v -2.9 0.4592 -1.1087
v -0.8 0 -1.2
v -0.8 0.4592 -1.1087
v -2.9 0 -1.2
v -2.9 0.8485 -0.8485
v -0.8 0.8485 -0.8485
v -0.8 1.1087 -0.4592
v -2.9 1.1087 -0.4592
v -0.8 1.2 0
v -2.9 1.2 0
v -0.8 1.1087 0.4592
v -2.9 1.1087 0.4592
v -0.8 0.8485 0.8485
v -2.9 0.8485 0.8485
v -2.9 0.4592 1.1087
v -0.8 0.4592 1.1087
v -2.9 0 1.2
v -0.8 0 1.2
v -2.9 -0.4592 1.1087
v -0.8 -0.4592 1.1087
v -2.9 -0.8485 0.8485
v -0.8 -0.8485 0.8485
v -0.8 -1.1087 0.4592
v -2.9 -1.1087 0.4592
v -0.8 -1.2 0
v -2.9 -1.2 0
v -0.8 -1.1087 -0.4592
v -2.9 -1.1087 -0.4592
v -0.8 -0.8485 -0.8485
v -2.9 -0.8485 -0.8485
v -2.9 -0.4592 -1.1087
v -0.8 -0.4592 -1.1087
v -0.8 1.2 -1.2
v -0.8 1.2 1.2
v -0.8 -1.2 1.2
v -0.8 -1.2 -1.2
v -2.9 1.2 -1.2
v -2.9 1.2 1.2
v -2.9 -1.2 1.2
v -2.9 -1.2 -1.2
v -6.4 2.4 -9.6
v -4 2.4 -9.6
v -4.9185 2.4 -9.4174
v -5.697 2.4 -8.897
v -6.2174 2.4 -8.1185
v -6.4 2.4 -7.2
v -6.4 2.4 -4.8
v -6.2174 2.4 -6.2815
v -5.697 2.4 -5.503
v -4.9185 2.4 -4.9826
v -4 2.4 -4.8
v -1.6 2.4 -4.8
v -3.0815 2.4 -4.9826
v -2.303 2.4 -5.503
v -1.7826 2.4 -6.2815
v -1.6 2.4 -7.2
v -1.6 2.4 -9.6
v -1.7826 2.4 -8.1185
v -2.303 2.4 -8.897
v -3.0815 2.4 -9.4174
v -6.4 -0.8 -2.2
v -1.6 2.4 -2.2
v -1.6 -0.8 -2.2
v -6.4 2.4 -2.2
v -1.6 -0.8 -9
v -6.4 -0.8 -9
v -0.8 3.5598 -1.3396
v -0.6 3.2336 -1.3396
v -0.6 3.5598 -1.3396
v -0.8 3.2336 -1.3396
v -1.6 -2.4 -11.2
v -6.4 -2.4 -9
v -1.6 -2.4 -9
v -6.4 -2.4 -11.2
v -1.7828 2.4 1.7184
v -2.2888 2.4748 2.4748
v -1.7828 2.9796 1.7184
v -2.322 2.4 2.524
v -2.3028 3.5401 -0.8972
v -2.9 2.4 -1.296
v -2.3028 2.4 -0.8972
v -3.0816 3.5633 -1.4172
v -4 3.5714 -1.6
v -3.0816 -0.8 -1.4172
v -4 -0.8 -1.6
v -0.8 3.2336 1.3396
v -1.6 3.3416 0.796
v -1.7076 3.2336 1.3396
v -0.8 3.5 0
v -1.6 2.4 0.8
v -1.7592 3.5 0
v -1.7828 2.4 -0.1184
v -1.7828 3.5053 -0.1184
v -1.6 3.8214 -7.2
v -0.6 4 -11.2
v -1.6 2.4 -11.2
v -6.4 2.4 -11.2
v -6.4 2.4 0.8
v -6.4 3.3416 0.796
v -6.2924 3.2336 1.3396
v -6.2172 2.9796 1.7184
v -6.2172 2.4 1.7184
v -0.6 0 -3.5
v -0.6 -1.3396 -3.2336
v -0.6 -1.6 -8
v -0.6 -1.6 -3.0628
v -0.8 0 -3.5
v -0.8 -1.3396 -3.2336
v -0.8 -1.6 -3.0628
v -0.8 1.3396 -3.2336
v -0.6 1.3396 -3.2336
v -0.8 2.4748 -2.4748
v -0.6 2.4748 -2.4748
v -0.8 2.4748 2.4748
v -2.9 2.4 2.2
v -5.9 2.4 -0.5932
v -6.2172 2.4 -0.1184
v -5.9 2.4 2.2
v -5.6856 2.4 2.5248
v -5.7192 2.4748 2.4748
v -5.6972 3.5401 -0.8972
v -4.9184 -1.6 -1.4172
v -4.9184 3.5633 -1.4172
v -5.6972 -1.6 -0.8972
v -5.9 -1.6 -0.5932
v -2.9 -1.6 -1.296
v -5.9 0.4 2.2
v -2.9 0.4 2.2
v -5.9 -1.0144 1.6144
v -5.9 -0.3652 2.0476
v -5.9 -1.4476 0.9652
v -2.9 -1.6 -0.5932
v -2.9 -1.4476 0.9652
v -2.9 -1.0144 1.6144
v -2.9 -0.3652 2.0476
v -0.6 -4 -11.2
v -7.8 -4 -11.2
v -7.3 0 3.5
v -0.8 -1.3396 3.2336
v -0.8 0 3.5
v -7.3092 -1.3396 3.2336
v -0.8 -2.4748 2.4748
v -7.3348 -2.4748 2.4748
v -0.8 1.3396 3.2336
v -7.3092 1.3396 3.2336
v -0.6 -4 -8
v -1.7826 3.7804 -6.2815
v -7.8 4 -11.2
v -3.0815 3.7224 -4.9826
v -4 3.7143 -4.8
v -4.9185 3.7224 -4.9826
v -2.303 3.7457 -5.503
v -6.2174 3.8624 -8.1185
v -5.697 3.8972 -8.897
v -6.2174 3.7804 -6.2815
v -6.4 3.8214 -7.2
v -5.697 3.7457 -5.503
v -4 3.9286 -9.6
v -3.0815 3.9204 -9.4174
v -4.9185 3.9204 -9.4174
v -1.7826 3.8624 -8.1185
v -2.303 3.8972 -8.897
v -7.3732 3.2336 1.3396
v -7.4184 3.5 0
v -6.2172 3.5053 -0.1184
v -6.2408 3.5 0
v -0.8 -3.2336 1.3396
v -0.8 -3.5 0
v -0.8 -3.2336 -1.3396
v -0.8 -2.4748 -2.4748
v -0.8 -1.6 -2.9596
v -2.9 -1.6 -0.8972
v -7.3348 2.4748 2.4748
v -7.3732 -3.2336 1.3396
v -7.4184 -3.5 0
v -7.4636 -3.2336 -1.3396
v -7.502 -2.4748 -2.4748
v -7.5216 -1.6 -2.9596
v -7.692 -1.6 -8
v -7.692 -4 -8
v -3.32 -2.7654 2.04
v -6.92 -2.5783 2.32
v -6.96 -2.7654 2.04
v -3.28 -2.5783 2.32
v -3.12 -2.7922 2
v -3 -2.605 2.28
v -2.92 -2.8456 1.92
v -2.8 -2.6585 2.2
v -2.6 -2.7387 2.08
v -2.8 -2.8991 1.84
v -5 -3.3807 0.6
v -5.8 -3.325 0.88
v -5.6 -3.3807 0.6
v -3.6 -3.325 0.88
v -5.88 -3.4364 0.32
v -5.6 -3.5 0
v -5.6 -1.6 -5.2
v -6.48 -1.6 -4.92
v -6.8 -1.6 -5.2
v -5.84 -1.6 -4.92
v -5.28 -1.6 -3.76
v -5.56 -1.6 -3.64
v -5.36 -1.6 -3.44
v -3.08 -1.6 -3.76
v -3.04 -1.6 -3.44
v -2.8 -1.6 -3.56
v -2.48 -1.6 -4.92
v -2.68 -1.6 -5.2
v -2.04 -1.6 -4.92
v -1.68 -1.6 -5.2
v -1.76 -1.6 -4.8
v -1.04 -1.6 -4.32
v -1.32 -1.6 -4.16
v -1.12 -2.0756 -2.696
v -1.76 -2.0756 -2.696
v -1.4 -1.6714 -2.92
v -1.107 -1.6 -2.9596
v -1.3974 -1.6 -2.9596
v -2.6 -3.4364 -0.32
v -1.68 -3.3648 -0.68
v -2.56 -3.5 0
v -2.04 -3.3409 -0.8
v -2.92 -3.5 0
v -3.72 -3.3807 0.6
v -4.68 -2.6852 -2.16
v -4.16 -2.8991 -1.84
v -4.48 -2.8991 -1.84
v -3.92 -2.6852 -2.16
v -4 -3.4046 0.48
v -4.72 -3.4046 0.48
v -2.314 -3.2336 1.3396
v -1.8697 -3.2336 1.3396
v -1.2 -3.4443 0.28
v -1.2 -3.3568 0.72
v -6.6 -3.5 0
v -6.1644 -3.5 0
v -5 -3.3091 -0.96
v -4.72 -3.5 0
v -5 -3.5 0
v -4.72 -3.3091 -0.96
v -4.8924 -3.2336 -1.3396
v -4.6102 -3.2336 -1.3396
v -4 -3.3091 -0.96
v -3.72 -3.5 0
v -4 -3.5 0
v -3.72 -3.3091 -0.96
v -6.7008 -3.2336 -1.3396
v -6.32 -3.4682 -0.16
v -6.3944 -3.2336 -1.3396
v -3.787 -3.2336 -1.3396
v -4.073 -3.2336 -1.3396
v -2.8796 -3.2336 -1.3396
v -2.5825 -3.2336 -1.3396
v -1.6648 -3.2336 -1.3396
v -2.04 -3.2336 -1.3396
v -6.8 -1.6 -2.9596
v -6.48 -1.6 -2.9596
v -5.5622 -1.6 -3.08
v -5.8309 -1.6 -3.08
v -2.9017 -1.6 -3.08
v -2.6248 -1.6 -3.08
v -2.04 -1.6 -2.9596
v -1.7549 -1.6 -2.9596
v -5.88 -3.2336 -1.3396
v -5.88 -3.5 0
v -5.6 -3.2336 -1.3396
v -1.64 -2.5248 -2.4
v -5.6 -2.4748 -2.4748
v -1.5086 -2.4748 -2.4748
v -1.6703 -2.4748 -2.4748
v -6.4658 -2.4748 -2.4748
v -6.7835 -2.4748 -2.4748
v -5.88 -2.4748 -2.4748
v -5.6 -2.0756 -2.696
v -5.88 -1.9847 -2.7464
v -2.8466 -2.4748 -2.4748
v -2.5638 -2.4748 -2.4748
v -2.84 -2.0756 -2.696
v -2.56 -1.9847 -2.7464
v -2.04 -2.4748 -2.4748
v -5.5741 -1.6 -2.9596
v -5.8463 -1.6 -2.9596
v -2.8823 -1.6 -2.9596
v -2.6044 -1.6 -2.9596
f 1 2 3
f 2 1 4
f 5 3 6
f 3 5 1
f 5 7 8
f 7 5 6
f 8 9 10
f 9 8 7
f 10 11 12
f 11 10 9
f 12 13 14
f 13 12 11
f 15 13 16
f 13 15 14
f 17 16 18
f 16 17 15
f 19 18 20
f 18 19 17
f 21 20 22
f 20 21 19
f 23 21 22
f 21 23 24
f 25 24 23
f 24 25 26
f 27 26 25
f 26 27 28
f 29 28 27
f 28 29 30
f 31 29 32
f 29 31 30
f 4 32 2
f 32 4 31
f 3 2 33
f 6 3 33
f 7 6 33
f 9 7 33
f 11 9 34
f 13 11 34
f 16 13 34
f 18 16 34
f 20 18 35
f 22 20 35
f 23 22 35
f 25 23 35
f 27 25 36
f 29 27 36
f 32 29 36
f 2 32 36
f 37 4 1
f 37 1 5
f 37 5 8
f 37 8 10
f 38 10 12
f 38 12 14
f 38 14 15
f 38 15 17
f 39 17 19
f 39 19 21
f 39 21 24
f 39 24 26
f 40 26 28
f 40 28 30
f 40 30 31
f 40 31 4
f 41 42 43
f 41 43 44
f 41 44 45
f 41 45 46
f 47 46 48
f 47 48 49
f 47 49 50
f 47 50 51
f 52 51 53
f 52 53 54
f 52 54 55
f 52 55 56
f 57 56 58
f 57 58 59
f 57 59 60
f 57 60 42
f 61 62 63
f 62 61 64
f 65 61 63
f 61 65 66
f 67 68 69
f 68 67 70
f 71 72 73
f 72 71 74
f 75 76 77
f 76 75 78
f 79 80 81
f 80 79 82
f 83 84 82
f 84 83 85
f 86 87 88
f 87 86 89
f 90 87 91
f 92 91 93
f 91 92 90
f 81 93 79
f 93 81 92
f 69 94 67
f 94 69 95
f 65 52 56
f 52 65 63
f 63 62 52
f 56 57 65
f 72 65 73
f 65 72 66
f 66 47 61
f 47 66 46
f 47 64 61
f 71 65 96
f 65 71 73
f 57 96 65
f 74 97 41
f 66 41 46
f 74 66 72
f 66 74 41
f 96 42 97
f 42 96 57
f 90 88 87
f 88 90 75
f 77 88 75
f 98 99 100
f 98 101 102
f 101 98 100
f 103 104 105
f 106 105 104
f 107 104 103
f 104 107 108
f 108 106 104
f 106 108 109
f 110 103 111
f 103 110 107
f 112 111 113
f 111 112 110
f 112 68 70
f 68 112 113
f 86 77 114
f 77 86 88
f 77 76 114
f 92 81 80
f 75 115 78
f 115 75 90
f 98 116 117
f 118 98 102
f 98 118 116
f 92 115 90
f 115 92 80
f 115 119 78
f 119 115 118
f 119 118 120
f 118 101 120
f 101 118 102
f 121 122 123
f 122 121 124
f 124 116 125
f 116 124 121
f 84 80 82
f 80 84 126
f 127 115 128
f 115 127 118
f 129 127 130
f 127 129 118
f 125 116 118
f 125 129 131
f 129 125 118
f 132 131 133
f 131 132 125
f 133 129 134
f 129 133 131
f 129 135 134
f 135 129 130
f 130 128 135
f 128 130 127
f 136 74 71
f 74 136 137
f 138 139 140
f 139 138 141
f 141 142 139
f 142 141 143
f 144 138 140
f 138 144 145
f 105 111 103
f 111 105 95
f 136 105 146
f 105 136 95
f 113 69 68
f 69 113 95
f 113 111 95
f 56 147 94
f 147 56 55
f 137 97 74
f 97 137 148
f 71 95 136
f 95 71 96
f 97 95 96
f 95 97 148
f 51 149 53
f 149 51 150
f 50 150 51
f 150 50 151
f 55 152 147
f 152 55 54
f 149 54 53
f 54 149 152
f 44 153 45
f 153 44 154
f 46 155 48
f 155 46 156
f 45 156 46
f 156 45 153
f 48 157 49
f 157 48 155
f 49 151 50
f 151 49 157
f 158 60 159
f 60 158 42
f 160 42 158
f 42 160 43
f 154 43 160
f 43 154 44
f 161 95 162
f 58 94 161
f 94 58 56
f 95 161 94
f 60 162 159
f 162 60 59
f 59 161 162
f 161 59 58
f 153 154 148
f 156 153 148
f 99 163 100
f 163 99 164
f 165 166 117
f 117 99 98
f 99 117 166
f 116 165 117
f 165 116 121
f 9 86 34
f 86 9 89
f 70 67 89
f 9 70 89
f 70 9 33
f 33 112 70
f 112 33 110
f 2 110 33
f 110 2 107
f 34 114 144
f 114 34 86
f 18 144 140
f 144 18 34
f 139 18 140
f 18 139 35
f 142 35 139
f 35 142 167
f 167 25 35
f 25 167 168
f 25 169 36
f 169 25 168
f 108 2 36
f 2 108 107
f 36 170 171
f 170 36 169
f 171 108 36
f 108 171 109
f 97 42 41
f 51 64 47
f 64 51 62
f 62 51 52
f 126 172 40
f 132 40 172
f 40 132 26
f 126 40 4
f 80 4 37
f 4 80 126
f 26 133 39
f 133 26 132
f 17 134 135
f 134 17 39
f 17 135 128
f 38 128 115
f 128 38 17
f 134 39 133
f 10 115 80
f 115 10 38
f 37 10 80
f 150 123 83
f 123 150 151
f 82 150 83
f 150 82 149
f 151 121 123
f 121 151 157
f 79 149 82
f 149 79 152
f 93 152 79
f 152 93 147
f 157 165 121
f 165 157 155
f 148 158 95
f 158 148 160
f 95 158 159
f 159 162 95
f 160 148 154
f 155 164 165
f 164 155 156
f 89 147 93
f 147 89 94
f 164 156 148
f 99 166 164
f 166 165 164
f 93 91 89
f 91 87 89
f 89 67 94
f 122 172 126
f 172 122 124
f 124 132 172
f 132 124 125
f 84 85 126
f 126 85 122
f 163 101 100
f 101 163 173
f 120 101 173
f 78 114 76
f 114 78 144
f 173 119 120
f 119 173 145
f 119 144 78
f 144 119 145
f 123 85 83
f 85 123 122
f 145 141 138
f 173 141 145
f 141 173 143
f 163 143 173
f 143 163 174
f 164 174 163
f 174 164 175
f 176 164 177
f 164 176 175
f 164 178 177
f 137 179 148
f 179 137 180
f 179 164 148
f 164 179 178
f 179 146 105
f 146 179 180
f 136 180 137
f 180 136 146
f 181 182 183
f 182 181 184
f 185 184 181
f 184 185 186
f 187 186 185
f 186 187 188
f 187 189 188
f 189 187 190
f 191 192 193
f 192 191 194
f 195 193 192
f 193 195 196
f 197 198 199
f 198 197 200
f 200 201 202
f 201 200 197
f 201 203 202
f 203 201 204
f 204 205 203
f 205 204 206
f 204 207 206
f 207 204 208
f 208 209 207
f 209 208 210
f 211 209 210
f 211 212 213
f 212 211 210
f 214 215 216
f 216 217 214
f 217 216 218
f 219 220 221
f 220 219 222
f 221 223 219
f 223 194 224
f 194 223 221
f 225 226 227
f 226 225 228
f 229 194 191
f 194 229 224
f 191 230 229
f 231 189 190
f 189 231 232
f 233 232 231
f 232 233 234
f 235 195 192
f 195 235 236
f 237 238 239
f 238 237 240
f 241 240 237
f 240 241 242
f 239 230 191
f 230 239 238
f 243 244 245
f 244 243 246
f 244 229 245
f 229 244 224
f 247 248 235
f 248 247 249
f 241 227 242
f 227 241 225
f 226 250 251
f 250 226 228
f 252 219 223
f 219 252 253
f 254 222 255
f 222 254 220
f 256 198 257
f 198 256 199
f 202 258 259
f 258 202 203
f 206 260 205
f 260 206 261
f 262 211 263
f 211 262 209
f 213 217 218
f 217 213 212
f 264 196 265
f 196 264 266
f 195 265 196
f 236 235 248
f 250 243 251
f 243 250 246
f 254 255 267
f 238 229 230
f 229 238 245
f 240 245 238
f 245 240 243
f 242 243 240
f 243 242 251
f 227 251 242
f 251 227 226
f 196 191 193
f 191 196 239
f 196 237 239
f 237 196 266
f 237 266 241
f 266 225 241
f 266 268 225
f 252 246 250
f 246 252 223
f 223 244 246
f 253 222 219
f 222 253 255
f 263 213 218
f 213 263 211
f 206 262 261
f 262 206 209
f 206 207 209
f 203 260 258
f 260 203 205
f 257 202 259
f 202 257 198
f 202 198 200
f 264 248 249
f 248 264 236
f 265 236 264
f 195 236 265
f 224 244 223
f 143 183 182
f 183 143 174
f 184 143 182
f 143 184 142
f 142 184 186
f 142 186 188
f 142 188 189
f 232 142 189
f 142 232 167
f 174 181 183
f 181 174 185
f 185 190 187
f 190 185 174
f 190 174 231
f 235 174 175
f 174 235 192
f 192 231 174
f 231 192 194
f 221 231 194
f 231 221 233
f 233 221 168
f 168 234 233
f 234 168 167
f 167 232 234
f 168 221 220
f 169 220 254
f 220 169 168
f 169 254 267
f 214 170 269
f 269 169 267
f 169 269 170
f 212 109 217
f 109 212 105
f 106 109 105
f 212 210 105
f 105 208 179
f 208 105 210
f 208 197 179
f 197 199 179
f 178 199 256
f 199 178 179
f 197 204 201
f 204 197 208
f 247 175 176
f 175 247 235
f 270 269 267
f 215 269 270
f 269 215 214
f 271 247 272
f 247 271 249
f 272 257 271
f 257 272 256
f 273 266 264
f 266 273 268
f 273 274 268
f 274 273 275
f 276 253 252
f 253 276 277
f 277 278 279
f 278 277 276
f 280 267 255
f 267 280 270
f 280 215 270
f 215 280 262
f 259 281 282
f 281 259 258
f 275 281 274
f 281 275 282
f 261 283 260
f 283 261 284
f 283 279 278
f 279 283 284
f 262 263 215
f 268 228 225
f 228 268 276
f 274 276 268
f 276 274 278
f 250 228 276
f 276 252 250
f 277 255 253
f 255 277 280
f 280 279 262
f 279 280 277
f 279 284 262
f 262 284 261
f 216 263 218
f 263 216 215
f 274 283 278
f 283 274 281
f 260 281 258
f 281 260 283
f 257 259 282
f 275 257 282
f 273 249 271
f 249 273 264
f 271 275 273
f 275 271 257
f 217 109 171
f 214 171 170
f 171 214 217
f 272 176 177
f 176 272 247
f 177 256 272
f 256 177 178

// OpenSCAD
use <../lib.scad>
use <s/3817bs01.scad>
function ldraw_lib__3816bpbc() = [
// 0 ~Minifig Leg Right with Iron Man Armoured Suit Mark VII Pattern (Obsolete)
// 0 Name: 3816bpbc.dat
// 0 Author: Magnus Forsberg [MagFors]
// 0 !LDRAW_ORG Part UPDATE 2023-03
// 0 !LICENSE Licensed under CC BY 4.0 : see CAreadme.txt
// 
// 0 BFC CERTIFY CCW
  [0,"BFC","CERTIFY"],
  [0,"BFC","CCW"],
// 
// 0 !KEYWORDS Bricklink 970c00pb0155, set 10721, set 6869
// 
// 0 !HISTORY 2013-12-23 [MagFors] Original design as 3815c89
// 0 !HISTORY 2020-06-18 [MagFors] Adapted to corrected geometry
// 0 !HISTORY 2020-12-29 [PTadmin] Official Update 2020-03
// 0 !HISTORY 2023-06-01 [Holly-Wood] Obsoleted due to bad geometry
// 0 !HISTORY 2023-06-24 [OrionP] Official Update 2023-03
// 
// 
// 1 16 0 0 0 -1 0 0 0 1 0 0 0 1 s\3817bs01.dat
  [1,16,0,0,0,-1,0,0,0,1,0,0,0,1, ldraw_lib__s__3817bs01()],
// 4 16 -19.23 20 -4 -19.23 20 -10 -1.5 20 -10 -1.5 20 -4
  [4,16,-19.23,20,-4,-19.23,20,-10,-1.5,20,-10,-1.5,20,-4],
// 4 16 -19.23 20 -10 -19.5 28 -10 -1.5 28 -10 -1.5 20 -10
  [4,16,-19.23,20,-10,-19.5,28,-10,-1.5,28,-10,-1.5,20,-10],
// 5 24 -2 3.349 -8.084 -18.659 3.349 -8.084 -2 0 -8.75 -2 6.187 -6.187
  [5,24,-2,3.349,-8.084,-18.659,3.349,-8.084,-2,0,-8.75,-2,6.187,-6.187],
// 5 24 -2 6.187 -6.187 -18.755 6.187 -6.187 -2 7.399 -4 -2 3.349 -8.084
  [5,24,-2,6.187,-6.187,-18.755,6.187,-6.187,-2,7.399,-4,-2,3.349,-8.084],
// 5 24 -2 0 -8.75 -18.546 0 -8.75 -2 3.349 -8.084 -2 -3.349 -8.084
  [5,24,-2,0,-8.75,-18.546,0,-8.75,-2,3.349,-8.084,-2,-3.349,-8.084],
// 5 24 -2 -3.349 -8.084 -18.433 -3.349 -8.084 -2 0 -8.75 -2 -6.187 -6.187
  [5,24,-2,-3.349,-8.084,-18.433,-3.349,-8.084,-2,0,-8.75,-2,-6.187,-6.187],
// 
// 0 // knee pad
// 4 0 -17.3 -5.8 -6.4457 -17.4 -5.1 -6.9136 -8.3 -5.1 -6.9136 -8.2 -5.8 -6.4457
  [4,0,-17.3,-5.8,-6.4457,-17.4,-5.1,-6.9136,-8.3,-5.1,-6.9136,-8.2,-5.8,-6.4457],
// 4 0 -8.2 -5.8 -6.4457 -8.3 -5.1 -6.9136 -7.8 -5 -6.9804 -7.5 -5.7 -6.5125
  [4,0,-8.2,-5.8,-6.4457,-8.3,-5.1,-6.9136,-7.8,-5,-6.9804,-7.5,-5.7,-6.5125],
// 4 0 -7.5 -5.7 -6.5125 -7.8 -5 -6.9804 -7.3 -4.8 -7.1141 -7 -5.5 -6.6462
  [4,0,-7.5,-5.7,-6.5125,-7.8,-5,-6.9804,-7.3,-4.8,-7.1141,-7,-5.5,-6.6462],
// 4 0 -6.5 -5.2 -6.8467 -7 -5.5 -6.6462 -7.3 -4.8 -7.1141 -7 -4.6 -7.2478
  [4,0,-6.5,-5.2,-6.8467,-7,-5.5,-6.6462,-7.3,-4.8,-7.1141,-7,-4.6,-7.2478],
// 4 0 -12.5 -1.5 -8.4517 -9 -2.2 -8.3125 -14.5 -2.2 -8.3125 -14 -1.5 -8.4517
  [4,0,-12.5,-1.5,-8.4517,-9,-2.2,-8.3125,-14.5,-2.2,-8.3125,-14,-1.5,-8.4517],
// 4 0 -14 -1.5 -8.4517 -14.5 -2.2 -8.3125 -14.7 -.8 -8.5909 -14 0 -8.75
  [4,0,-14,-1.5,-8.4517,-14.5,-2.2,-8.3125,-14.7,-.8,-8.5909,-14,0,-8.75],
// 4 0 -16.2 12.3 -4 -17 13 -4 -14 13 -4 -14.6 12.3 -4
  [4,0,-16.2,12.3,-4,-17,13,-4,-14,13,-4,-14.6,12.3,-4],
// 4 0 -13.9 9.1 -4 -14.6 12.3 -4 -14 13 -4 -13.2 9.4 -4
  [4,0,-13.9,9.1,-4,-14.6,12.3,-4,-14,13,-4,-13.2,9.4,-4],
// 4 0 -13.4 8.6 -4 -13.9 9.1 -4 -13.2 9.4 -4 -7.7 9.4 -4
  [4,0,-13.4,8.6,-4,-13.9,9.1,-4,-13.2,9.4,-4,-7.7,9.4,-4],
// 4 0 -7.6 8.6 -4 -13.4 8.6 -4 -7.7 9.4 -4 -7 8.9 -4
  [4,0,-7.6,8.6,-4,-13.4,8.6,-4,-7.7,9.4,-4,-7,8.9,-4],
// 4 0 -7.7 9.4 -4 -6.7 13 -4 -6.2 12.3 -4 -7 8.9 -4
  [4,0,-7.7,9.4,-4,-6.7,13,-4,-6.2,12.3,-4,-7,8.9,-4],
// 4 0 -4.2 13 -4 -5.1 12.3 -4 -6.2 12.3 -4 -6.7 13 -4
  [4,0,-4.2,13,-4,-5.1,12.3,-4,-6.2,12.3,-4,-6.7,13,-4],
// 3 0 -4.4 12 -4 -5.1 12.3 -4 -4.2 13 -4
  [3,0,-4.4,12,-4,-5.1,12.3,-4,-4.2,13,-4],
// 4 0 -3.3 10.4 -4 -4.4 12 -4 -4.2 13 -4 -2.6 10.8 -4
  [4,0,-3.3,10.4,-4,-4.4,12,-4,-4.2,13,-4,-2.6,10.8,-4],
// 3 0 -2.8 6.74 -5.1891 -4.4 6.74 -5.1891 -3.5 7.3 -4.1786
  [3,0,-2.8,6.74,-5.1891,-4.4,6.74,-5.1891,-3.5,7.3,-4.1786],
// 4 0 -3.5 7.3 -4.1786 -3.4936 7.399 -4 -2.7675 7.399 -4 -2.8 6.74 -5.1891
  [4,0,-3.5,7.3,-4.1786,-3.4936,7.399,-4,-2.7675,7.399,-4,-2.8,6.74,-5.1891],
// 4 0 -6.5 .8 -8.5909 -5.1 2 -8.3523 -4.2 1.7 -8.4119 -6.4 0 -8.75
  [4,0,-6.5,.8,-8.5909,-5.1,2,-8.3523,-4.2,1.7,-8.4119,-6.4,0,-8.75],
// 3 0 -6.4 0 -8.75 -7.3 0 -8.75 -6.5 .8 -8.5909
  [3,0,-6.4,0,-8.75,-7.3,0,-8.75,-6.5,.8,-8.5909],
// 4 0 -9.3 -1.5 -8.4517 -7.3 0 -8.75 -6.4 0 -8.75 -9 -2.2 -8.3125
  [4,0,-9.3,-1.5,-8.4517,-7.3,0,-8.75,-6.4,0,-8.75,-9,-2.2,-8.3125],
// 4 0 -11.2 4.6 -7.2478 -11.7 5.4 -6.7131 -9.8 5.4 -6.7131 -10.4 4.6 -7.2478
  [4,0,-11.2,4.6,-7.2478,-11.7,5.4,-6.7131,-9.8,5.4,-6.7131,-10.4,4.6,-7.2478],
// 4 0 -10 -1.2 -8.5114 -9.3 -1.5 -8.4517 -9 -2.2 -8.3125 -12.5 -1.5 -8.4517
  [4,0,-10,-1.2,-8.5114,-9.3,-1.5,-8.4517,-9,-2.2,-8.3125,-12.5,-1.5,-8.4517],
// 3 0 -12.5 -1.5 -8.4517 -11.8 -1.2 -8.5114 -10 -1.2 -8.5114
  [3,0,-12.5,-1.5,-8.4517,-11.8,-1.2,-8.5114,-10,-1.2,-8.5114],
// 4 0 -6.5 -5.2 -6.8467 -7 -4.6 -7.2478 -5.785 -3.349 -8.084 -4.6743 -3.349 -8.084
  [4,0,-6.5,-5.2,-6.8467,-7,-4.6,-7.2478,-5.785,-3.349,-8.084,-4.6743,-3.349,-8.084],
// 4 0 -3 -.7 -8.6108 -3 -1.8 -8.392 -4.6743 -3.349 -8.084 -5.785 -3.349 -8.084
  [4,0,-3,-.7,-8.6108,-3,-1.8,-8.392,-4.6743,-3.349,-8.084,-5.785,-3.349,-8.084],
// 4 0 -15.411 0 -8.75 -14.7 -.8 -8.5909 -14.5 -2.2 -8.3125 -16.5 0 -8.75
  [4,0,-15.411,0,-8.75,-14.7,-.8,-8.5909,-14.5,-2.2,-8.3125,-16.5,0,-8.75],
// 4 0 -11.8 0 -8.75 -12.5 0 -8.75 -12.5 2.4 -8.2727 -11.8 2.4 -8.2727
  [4,0,-11.8,0,-8.75,-12.5,0,-8.75,-12.5,2.4,-8.2727,-11.8,2.4,-8.2727],
// 4 0 -12.2311 3.349 -8.084 -11.5254 3.349 -8.084 -11.8 2.4 -8.2727 -12.5 2.4 -8.2727
  [4,0,-12.2311,3.349,-8.084,-11.5254,3.349,-8.084,-11.8,2.4,-8.2727,-12.5,2.4,-8.2727],
// 4 0 -11.8 0 -8.75 -11.8 -1.2 -8.5114 -12.5 -1.5 -8.4517 -12.5 0 -8.75
  [4,0,-11.8,0,-8.75,-11.8,-1.2,-8.5114,-12.5,-1.5,-8.4517,-12.5,0,-8.75],
// 4 0 -9.3 0 -8.75 -10 0 -8.75 -10 2.4 -8.2727 -9.3 2.4 -8.2727
  [4,0,-9.3,0,-8.75,-10,0,-8.75,-10,2.4,-8.2727,-9.3,2.4,-8.2727],
// 4 0 -9.3 0 -8.75 -9.3 -1.5 -8.4517 -10 -1.2 -8.5114 -10 0 -8.75
  [4,0,-9.3,0,-8.75,-9.3,-1.5,-8.4517,-10,-1.2,-8.5114,-10,0,-8.75],
// 4 0 -15.986 3.349 -8.084 -15.8 .4 -8.6705 -16.5 0 -8.75 -16.7519 3.349 -8.084
  [4,0,-15.986,3.349,-8.084,-15.8,.4,-8.6705,-16.5,0,-8.75,-16.7519,3.349,-8.084],
// 4 0 -12.2311 3.349 -8.084 -11.7 5.4 -6.7131 -11.2 4.6 -7.2478 -11.5254 3.349 -8.084
  [4,0,-12.2311,3.349,-8.084,-11.7,5.4,-6.7131,-11.2,4.6,-7.2478,-11.5254,3.349,-8.084],
// 4 0 -10.1824 3.349 -8.084 -10.4 4.6 -7.2478 -9.8 5.4 -6.7131 -9.4676 3.349 -8.084
  [4,0,-10.1824,3.349,-8.084,-10.4,4.6,-7.2478,-9.8,5.4,-6.7131,-9.4676,3.349,-8.084],
// 4 0 -6.4562 3.349 -8.084 -6.5 .8 -8.5909 -7.3 0 -8.75 -7.1991 3.349 -8.084
  [4,0,-6.4562,3.349,-8.084,-6.5,.8,-8.5909,-7.3,0,-8.75,-7.1991,3.349,-8.084],
// 4 0 -4.1619 3.349 -8.084 -4.2 1.7 -8.4119 -5.1 2 -8.3523 -5.1 3.349 -8.084
  [4,0,-4.1619,3.349,-8.084,-4.2,1.7,-8.4119,-5.1,2,-8.3523,-5.1,3.349,-8.084],
// 4 0 -17 7.399 -4 -17 13 -4 -16.2 12.3 -4 -16.2 7.399 -4
  [4,0,-17,7.399,-4,-17,13,-4,-16.2,12.3,-4,-16.2,7.399,-4],
// 4 0 -14.5772 7.7 -4 -13.9 9.1 -4 -13.4 8.6 -4 -13.9056 7.7 -4
  [4,0,-14.5772,7.7,-4,-13.9,9.1,-4,-13.4,8.6,-4,-13.9056,7.7,-4],
// 4 0 -7.2542 7.7 -4 -7.6 8.6 -4 -7 8.9 -4 -6.5619 7.7 -4
  [4,0,-7.2542,7.7,-4,-7.6,8.6,-4,-7,8.9,-4,-6.5619,7.7,-4],
// 4 0 -5.1 12.3 -4 -4.4 12 -4 -4.3872 7.399 -4 -5.1 7.399 -4
  [4,0,-5.1,12.3,-4,-4.4,12,-4,-4.3872,7.399,-4,-5.1,7.399,-4],
// 4 0 -3.4936 7.399 -4 -3.3 10.4 -4 -2.6 10.8 -4 -2.7675 7.399 -4
  [4,0,-3.4936,7.399,-4,-3.3,10.4,-4,-2.6,10.8,-4,-2.7675,7.399,-4],
// 4 0 -14 3.349 -8.084 -14 0 -8.75 -14.7 0 -8.75 -14.7 3.349 -8.084
  [4,0,-14,3.349,-8.084,-14,0,-8.75,-14.7,0,-8.75,-14.7,3.349,-8.084],
// 3 0 -14.7 -.8 -8.5909 -14.7 0 -8.75 -14 0 -8.75
  [3,0,-14.7,-.8,-8.5909,-14.7,0,-8.75,-14,0,-8.75],
// 3 0 -15.411 0 -8.75 -16.5 0 -8.75 -15.8 .4 -8.6705
  [3,0,-15.411,0,-8.75,-16.5,0,-8.75,-15.8,.4,-8.6705],
// 4 0 -9.3 2.4 -8.2727 -10 2.4 -8.2727 -10.1824 3.349 -8.084 -9.4676 3.349 -8.084
  [4,0,-9.3,2.4,-8.2727,-10,2.4,-8.2727,-10.1824,3.349,-8.084,-9.4676,3.349,-8.084],
// 3 0 -4.1619 3.349 -8.084 -5.1 3.349 -8.084 -4.1 6 -6.312
  [3,0,-4.1619,3.349,-8.084,-5.1,3.349,-8.084,-4.1,6,-6.312],
// 4 80 -10 -1.2 -8.5114 -11.8 -1.2 -8.5114 -11.8 0 -8.75 -10 0 -8.75
  [4,80,-10,-1.2,-8.5114,-11.8,-1.2,-8.5114,-11.8,0,-8.75,-10,0,-8.75],
// 4 80 -10 0 -8.75 -11.8 0 -8.75 -11.8 2.4 -8.2727 -10 2.4 -8.2727
  [4,80,-10,0,-8.75,-11.8,0,-8.75,-11.8,2.4,-8.2727,-10,2.4,-8.2727],
// 4 80 -11.8 2.4 -8.2727 -11.5254 3.349 -8.084 -10.1824 3.349 -8.084 -10 2.4 -8.2727
  [4,80,-11.8,2.4,-8.2727,-11.5254,3.349,-8.084,-10.1824,3.349,-8.084,-10,2.4,-8.2727],
// 4 80 -11.5254 3.349 -8.084 -11.2 4.6 -7.2478 -10.4 4.6 -7.2478 -10.1824 3.349 -8.084
  [4,80,-11.5254,3.349,-8.084,-11.2,4.6,-7.2478,-10.4,4.6,-7.2478,-10.1824,3.349,-8.084],
// 4 82 -14 -1.5 -8.4517 -14 0 -8.75 -12.5 0 -8.75 -12.5 -1.5 -8.4517
  [4,82,-14,-1.5,-8.4517,-14,0,-8.75,-12.5,0,-8.75,-12.5,-1.5,-8.4517],
// 4 82 -14 0 -8.75 -14 3.349 -8.084 -12.5 2.4 -8.2727 -12.5 0 -8.75
  [4,82,-14,0,-8.75,-14,3.349,-8.084,-12.5,2.4,-8.2727,-12.5,0,-8.75],
// 3 82 -12.5 2.4 -8.2727 -14 3.349 -8.084 -12.2311 3.349 -8.084
  [3,82,-12.5,2.4,-8.2727,-14,3.349,-8.084,-12.2311,3.349,-8.084],
// 3 82 -14 3.349 -8.084 -11.7 5.4 -6.7131 -12.2311 3.349 -8.084
  [3,82,-14,3.349,-8.084,-11.7,5.4,-6.7131,-12.2311,3.349,-8.084],
// 3 82 -14 3.349 -8.084 -14 6.187 -6.187 -11.7 5.4 -6.7131
  [3,82,-14,3.349,-8.084,-14,6.187,-6.187,-11.7,5.4,-6.7131],
// 4 82 -9.3 2.4 -8.2727 -9.4676 3.349 -8.084 -7.1991 3.349 -8.084 -7.3 0 -8.75
  [4,82,-9.3,2.4,-8.2727,-9.4676,3.349,-8.084,-7.1991,3.349,-8.084,-7.3,0,-8.75],
// 3 82 -7.3 0 -8.75 -9.3 0 -8.75 -9.3 2.4 -8.2727
  [3,82,-7.3,0,-8.75,-9.3,0,-8.75,-9.3,2.4,-8.2727],
// 4 82 -5.1 2 -8.3523 -6.5 .8 -8.5909 -6.4562 3.349 -8.084 -5.1 3.349 -8.084
  [4,82,-5.1,2,-8.3523,-6.5,.8,-8.5909,-6.4562,3.349,-8.084,-5.1,3.349,-8.084],
// 4 82 -4.3872 7.399 -4 -4.4 12 -4 -3.3 10.4 -4 -3.4936 7.399 -4
  [4,82,-4.3872,7.399,-4,-4.4,12,-4,-3.3,10.4,-4,-3.4936,7.399,-4],
// 4 82 -5.1 7.399 -4 -6.5619 7.7 -4 -7 8.9 -4 -5.1 12.3 -4
  [4,82,-5.1,7.399,-4,-6.5619,7.7,-4,-7,8.9,-4,-5.1,12.3,-4],
// 3 82 -7 8.9 -4 -6.2 12.3 -4 -5.1 12.3 -4
  [3,82,-7,8.9,-4,-6.2,12.3,-4,-5.1,12.3,-4],
// 4 82 -13.9056 7.7 -4 -13.4 8.6 -4 -7.6 8.6 -4 -7.2542 7.7 -4
  [4,82,-13.9056,7.7,-4,-13.4,8.6,-4,-7.6,8.6,-4,-7.2542,7.7,-4],
// 4 82 -13.9 9.1 -4 -14.5772 7.7 -4 -16.2 7.399 -4 -16.2 12.3 -4
  [4,82,-13.9,9.1,-4,-14.5772,7.7,-4,-16.2,7.399,-4,-16.2,12.3,-4],
// 3 82 -13.9 9.1 -4 -16.2 12.3 -4 -14.6 12.3 -4
  [3,82,-13.9,9.1,-4,-16.2,12.3,-4,-14.6,12.3,-4],
// 4 82 -15.8 .4 -8.6705 -15.986 3.349 -8.084 -14.7 3.349 -8.084 -15.411 0 -8.75
  [4,82,-15.8,.4,-8.6705,-15.986,3.349,-8.084,-14.7,3.349,-8.084,-15.411,0,-8.75],
// 3 82 -14.7 0 -8.75 -15.411 0 -8.75 -14.7 3.349 -8.084
  [3,82,-14.7,0,-8.75,-15.411,0,-8.75,-14.7,3.349,-8.084],
// 3 82 -14.7 -.8 -8.5909 -15.411 0 -8.75 -14.7 0 -8.75
  [3,82,-14.7,-.8,-8.5909,-15.411,0,-8.75,-14.7,0,-8.75],
// 3 82 -9.3 -1.5 -8.4517 -9.3 0 -8.75 -7.3 0 -8.75
  [3,82,-9.3,-1.5,-8.4517,-9.3,0,-8.75,-7.3,0,-8.75],
// 4 16 -17.4 -5.1 -6.9136 -17.3 -5.8 -6.4457 -18.337 -6.187 -6.187 -18.433 -3.349 -8.084
  [4,16,-17.4,-5.1,-6.9136,-17.3,-5.8,-6.4457,-18.337,-6.187,-6.187,-18.433,-3.349,-8.084],
// 4 16 -18.337 -6.187 -6.187 -17.3 -5.8 -6.4457 -8.2 -5.8 -6.4457 -2 -6.187 -6.187
  [4,16,-18.337,-6.187,-6.187,-17.3,-5.8,-6.4457,-8.2,-5.8,-6.4457,-2,-6.187,-6.187],
// 3 16 -2 -6.187 -6.187 -8.2 -5.8 -6.4457 -7.5 -5.7 -6.5125
  [3,16,-2,-6.187,-6.187,-8.2,-5.8,-6.4457,-7.5,-5.7,-6.5125],
// 3 16 -2 -6.187 -6.187 -7.5 -5.7 -6.5125 -7 -5.5 -6.6462
  [3,16,-2,-6.187,-6.187,-7.5,-5.7,-6.5125,-7,-5.5,-6.6462],
// 3 16 -2 -6.187 -6.187 -7 -5.5 -6.6462 -6.5 -5.2 -6.8467
  [3,16,-2,-6.187,-6.187,-7,-5.5,-6.6462,-6.5,-5.2,-6.8467],
// 4 16 -2 -6.187 -6.187 -6.5 -5.2 -6.8467 -4.6743 -3.349 -8.084 -2 -3.349 -8.084
  [4,16,-2,-6.187,-6.187,-6.5,-5.2,-6.8467,-4.6743,-3.349,-8.084,-2,-3.349,-8.084],
// 4 16 -8.3 -5.1 -6.9136 -17.4 -5.1 -6.9136 -18.433 -3.349 -8.084 -7.8 -5 -6.9804
  [4,16,-8.3,-5.1,-6.9136,-17.4,-5.1,-6.9136,-18.433,-3.349,-8.084,-7.8,-5,-6.9804],
// 4 16 -7.3 -4.8 -7.1141 -7.8 -5 -6.9804 -18.433 -3.349 -8.084 -7 -4.6 -7.2478
  [4,16,-7.3,-4.8,-7.1141,-7.8,-5,-6.9804,-18.433,-3.349,-8.084,-7,-4.6,-7.2478],
// 3 16 -7 -4.6 -7.2478 -18.433 -3.349 -8.084 -5.785 -3.349 -8.084
  [3,16,-7,-4.6,-7.2478,-18.433,-3.349,-8.084,-5.785,-3.349,-8.084],
// 4 16 -18.433 -3.349 -8.084 -18.546 0 -8.75 -16.5 0 -8.75 -14.5 -2.2 -8.3125
  [4,16,-18.433,-3.349,-8.084,-18.546,0,-8.75,-16.5,0,-8.75,-14.5,-2.2,-8.3125],
// 4 16 -18.433 -3.349 -8.084 -14.5 -2.2 -8.3125 -9 -2.2 -8.3125 -5.785 -3.349 -8.084
  [4,16,-18.433,-3.349,-8.084,-14.5,-2.2,-8.3125,-9,-2.2,-8.3125,-5.785,-3.349,-8.084],
// 4 16 -5.785 -3.349 -8.084 -9 -2.2 -8.3125 -6.4 0 -8.75 -3 -.7 -8.6108
  [4,16,-5.785,-3.349,-8.084,-9,-2.2,-8.3125,-6.4,0,-8.75,-3,-.7,-8.6108],
// 3 16 -3 -.7 -8.6108 -6.4 0 -8.75 -2 0 -8.75
  [3,16,-3,-.7,-8.6108,-6.4,0,-8.75,-2,0,-8.75],
// 4 16 -3 -1.8 -8.392 -3 -.7 -8.6108 -2 0 -8.75 -2 -3.349 -8.084
  [4,16,-3,-1.8,-8.392,-3,-.7,-8.6108,-2,0,-8.75,-2,-3.349,-8.084],
// 3 16 -2 -3.349 -8.084 -4.6743 -3.349 -8.084 -3 -1.8 -8.392
  [3,16,-2,-3.349,-8.084,-4.6743,-3.349,-8.084,-3,-1.8,-8.392],
// 3 16 -2 0 -8.75 -6.4 0 -8.75 -4.2 1.7 -8.4119
  [3,16,-2,0,-8.75,-6.4,0,-8.75,-4.2,1.7,-8.4119],
// 4 16 -2 0 -8.75 -4.2 1.7 -8.4119 -4.1619 3.349 -8.084 -2 3.349 -8.084
  [4,16,-2,0,-8.75,-4.2,1.7,-8.4119,-4.1619,3.349,-8.084,-2,3.349,-8.084],
// 3 16 -2 3.349 -8.084 -4.1619 3.349 -8.084 -4.1 6 -6.312
  [3,16,-2,3.349,-8.084,-4.1619,3.349,-8.084,-4.1,6,-6.312],
// 3 16 -2.8 6.74 -5.1891 -2 6.187 -6.187 -3.7715 6.187 -6.187
  [3,16,-2.8,6.74,-5.1891,-2,6.187,-6.187,-3.7715,6.187,-6.187],
// 4 16 -2 6.187 -6.187 -2 3.349 -8.084 -4.1 6 -6.312 -3.7715 6.187 -6.187
  [4,16,-2,6.187,-6.187,-2,3.349,-8.084,-4.1,6,-6.312,-3.7715,6.187,-6.187],
// 4 16 -2 7.657 -4 -2.7675 7.399 -4 -2.6 10.8 -4 -1.5 20 -4
  [4,16,-2,7.657,-4,-2.7675,7.399,-4,-2.6,10.8,-4,-1.5,20,-4],
// 3 16 -1.5 7.657 -4 -2 7.657 -4 -1.5 20 -4
  [3,16,-1.5,7.657,-4,-2,7.657,-4,-1.5,20,-4],
// 3 16 -2.6 10.8 -4 -4.2 13 -4 -1.5 20 -4
  [3,16,-2.6,10.8,-4,-4.2,13,-4,-1.5,20,-4],
// 4 16 -1.5 20 -4 -4.2 13 -4 -6.7 13 -4 -19.23 20 -4
  [4,16,-1.5,20,-4,-4.2,13,-4,-6.7,13,-4,-19.23,20,-4],
// 3 16 -6.7 13 -4 -14 13 -4 -19.23 20 -4
  [3,16,-6.7,13,-4,-14,13,-4,-19.23,20,-4],
// 3 16 -14 13 -4 -17 13 -4 -19.23 20 -4
  [3,16,-14,13,-4,-17,13,-4,-19.23,20,-4],
// 4 16 -18.804 7.399 -4 -19.23 20 -4 -17 13 -4 -17 7.399 -4
  [4,16,-18.804,7.399,-4,-19.23,20,-4,-17,13,-4,-17,7.399,-4],
// 4 16 -13.2 9.4 -4 -14 13 -4 -6.7 13 -4 -7.7 9.4 -4
  [4,16,-13.2,9.4,-4,-14,13,-4,-6.7,13,-4,-7.7,9.4,-4],
// 4 16 -18.546 0 -8.75 -18.659 3.349 -8.084 -16.7519 3.349 -8.084 -16.5 0 -8.75
  [4,16,-18.546,0,-8.75,-18.659,3.349,-8.084,-16.7519,3.349,-8.084,-16.5,0,-8.75],
// 3 0 -4.1758 6.187 -6.187 -3.7715 6.187 -6.187 -4.1 6 -6.312
  [3,0,-4.1758,6.187,-6.187,-3.7715,6.187,-6.187,-4.1,6,-6.312],
// 4 0 -4.1758 6.187 -6.187 -4.4 6.74 -5.1891 -2.8 6.74 -5.1891 -3.7715 6.187 -6.187
  [4,0,-4.1758,6.187,-6.187,-4.4,6.74,-5.1891,-2.8,6.74,-5.1891,-3.7715,6.187,-6.187],
// 4 0 -16.9587 6.187 -6.187 -16.1644 6.187 -6.187 -15.986 3.349 -8.084 -16.7519 3.349 -8.084
  [4,0,-16.9587,6.187,-6.187,-16.1644,6.187,-6.187,-15.986,3.349,-8.084,-16.7519,3.349,-8.084],
// 4 0 -17 7.399 -4 -16.2 7.399 -4 -16.1644 6.187 -6.187 -16.9587 6.187 -6.187
  [4,0,-17,7.399,-4,-16.2,7.399,-4,-16.1644,6.187,-6.187,-16.9587,6.187,-6.187],
// 4 0 -14 3.349 -8.084 -14.7 3.349 -8.084 -14.7 6.187 -6.187 -14 6.187 -6.187
  [4,0,-14,3.349,-8.084,-14.7,3.349,-8.084,-14.7,6.187,-6.187,-14,6.187,-6.187],
// 4 0 -14.7 6.866 -4.9617 -14 6.74 -5.1891 -14 6.187 -6.187 -14.7 6.187 -6.187
  [4,0,-14.7,6.866,-4.9617,-14,6.74,-5.1891,-14,6.187,-6.187,-14.7,6.187,-6.187],
// 4 0 -6.4562 3.349 -8.084 -7.1991 3.349 -8.084 -7.1165 6.187 -6.187 -6.4094 6.187 -6.187
  [4,0,-6.4562,3.349,-8.084,-7.1991,3.349,-8.084,-7.1165,6.187,-6.187,-6.4094,6.187,-6.187],
// 4 0 -7.1 6.74 -5.1891 -6.4 6.866 -4.9617 -6.4094 6.187 -6.187 -7.1165 6.187 -6.187
  [4,0,-7.1,6.74,-5.1891,-6.4,6.866,-4.9617,-6.4094,6.187,-6.187,-7.1165,6.187,-6.187],
// 4 0 -5.1 6.187 -6.187 -4.1758 6.187 -6.187 -4.1 6 -6.312 -5.1 3.349 -8.084
  [4,0,-5.1,6.187,-6.187,-4.1758,6.187,-6.187,-4.1,6,-6.312,-5.1,3.349,-8.084],
// 4 0 -5.1 7.399 -4 -4.4 6.74 -5.1891 -4.1758 6.187 -6.187 -5.1 6.187 -6.187
  [4,0,-5.1,7.399,-4,-4.4,6.74,-5.1891,-4.1758,6.187,-6.187,-5.1,6.187,-6.187],
// 4 0 -13.9352 7.399 -4 -14.6157 7.399 -4 -14.5772 7.7 -4 -13.9056 7.7 -4
  [4,0,-13.9352,7.399,-4,-14.6157,7.399,-4,-14.5772,7.7,-4,-13.9056,7.7,-4],
// 4 0 -13.9352 7.399 -4 -14 6.74 -5.1891 -14.7 6.866 -4.9617 -14.6157 7.399 -4
  [4,0,-13.9352,7.399,-4,-14,6.74,-5.1891,-14.7,6.866,-4.9617,-14.6157,7.399,-4],
// 4 0 -7.2542 7.7 -4 -6.5619 7.7 -4 -6.5111 7.399 -4 -7.2058 7.399 -4
  [4,0,-7.2542,7.7,-4,-6.5619,7.7,-4,-6.5111,7.399,-4,-7.2058,7.399,-4],
// 4 0 -6.5111 7.399 -4 -6.4 6.866 -4.9617 -7.1 6.74 -5.1891 -7.2058 7.399 -4
  [4,0,-6.5111,7.399,-4,-6.4,6.866,-4.9617,-7.1,6.74,-5.1891,-7.2058,7.399,-4],
// 3 0 -5.1 7.399 -4 -4.3872 7.399 -4 -4.4 6.74 -5.1891
  [3,0,-5.1,7.399,-4,-4.3872,7.399,-4,-4.4,6.74,-5.1891],
// 4 82 -14 6.187 -6.187 -7.1165 6.187 -6.187 -9.8 5.4 -6.7131 -11.7 5.4 -6.7131
  [4,82,-14,6.187,-6.187,-7.1165,6.187,-6.187,-9.8,5.4,-6.7131,-11.7,5.4,-6.7131],
// 4 82 -7.1165 6.187 -6.187 -14 6.187 -6.187 -14 6.74 -5.1891 -7.1 6.74 -5.1891
  [4,82,-7.1165,6.187,-6.187,-14,6.187,-6.187,-14,6.74,-5.1891,-7.1,6.74,-5.1891],
// 3 82 -9.4676 3.349 -8.084 -9.8 5.4 -6.7131 -7.1165 6.187 -6.187
  [3,82,-9.4676,3.349,-8.084,-9.8,5.4,-6.7131,-7.1165,6.187,-6.187],
// 3 82 -7.1165 6.187 -6.187 -7.1991 3.349 -8.084 -9.4676 3.349 -8.084
  [3,82,-7.1165,6.187,-6.187,-7.1991,3.349,-8.084,-9.4676,3.349,-8.084],
// 4 82 -6.4562 3.349 -8.084 -6.4094 6.187 -6.187 -5.1 6.187 -6.187 -5.1 3.349 -8.084
  [4,82,-6.4562,3.349,-8.084,-6.4094,6.187,-6.187,-5.1,6.187,-6.187,-5.1,3.349,-8.084],
// 4 82 -5.1 7.399 -4 -5.1 6.187 -6.187 -6.4094 6.187 -6.187 -6.4 6.866 -4.9617
  [4,82,-5.1,7.399,-4,-5.1,6.187,-6.187,-6.4094,6.187,-6.187,-6.4,6.866,-4.9617],
// 3 82 -6.4 6.866 -4.9617 -6.5111 7.399 -4 -5.1 7.399 -4
  [3,82,-6.4,6.866,-4.9617,-6.5111,7.399,-4,-5.1,7.399,-4],
// 3 82 -5.1 7.399 -4 -6.5111 7.399 -4 -6.5619 7.7 -4
  [3,82,-5.1,7.399,-4,-6.5111,7.399,-4,-6.5619,7.7,-4],
// 4 82 -3.5 7.3 -4.1786 -4.4 6.74 -5.1891 -4.3872 7.399 -4 -3.4936 7.399 -4
  [4,82,-3.5,7.3,-4.1786,-4.4,6.74,-5.1891,-4.3872,7.399,-4,-3.4936,7.399,-4],
// 4 82 -7.1 6.74 -5.1891 -14 6.74 -5.1891 -13.9352 7.399 -4 -7.2058 7.399 -4
  [4,82,-7.1,6.74,-5.1891,-14,6.74,-5.1891,-13.9352,7.399,-4,-7.2058,7.399,-4],
// 4 82 -7.2542 7.7 -4 -7.2058 7.399 -4 -13.9352 7.399 -4 -13.9056 7.7 -4
  [4,82,-7.2542,7.7,-4,-7.2058,7.399,-4,-13.9352,7.399,-4,-13.9056,7.7,-4],
// 3 82 -16.2 7.399 -4 -14.5772 7.7 -4 -14.6157 7.399 -4
  [3,82,-16.2,7.399,-4,-14.5772,7.7,-4,-14.6157,7.399,-4],
// 3 82 -14.7 6.866 -4.9617 -16.2 7.399 -4 -14.6157 7.399 -4
  [3,82,-14.7,6.866,-4.9617,-16.2,7.399,-4,-14.6157,7.399,-4],
// 4 82 -14.7 6.187 -6.187 -14.7 3.349 -8.084 -15.986 3.349 -8.084 -16.1644 6.187 -6.187
  [4,82,-14.7,6.187,-6.187,-14.7,3.349,-8.084,-15.986,3.349,-8.084,-16.1644,6.187,-6.187],
// 4 82 -14.7 6.866 -4.9617 -14.7 6.187 -6.187 -16.1644 6.187 -6.187 -16.2 7.399 -4
  [4,82,-14.7,6.866,-4.9617,-14.7,6.187,-6.187,-16.1644,6.187,-6.187,-16.2,7.399,-4],
// 3 16 -2.7675 7.399 -4 -2 7.657 -4 -2 7.399 -4
  [3,16,-2.7675,7.399,-4,-2,7.657,-4,-2,7.399,-4],
// 4 16 -2.7675 7.399 -4 -2 7.399 -4 -2 6.187 -6.187 -2.8 6.74 -5.1891
  [4,16,-2.7675,7.399,-4,-2,7.399,-4,-2,6.187,-6.187,-2.8,6.74,-5.1891],
// 4 16 -16.7519 3.349 -8.084 -18.659 3.349 -8.084 -18.755 6.187 -6.187 -16.9587 6.187 -6.187
  [4,16,-16.7519,3.349,-8.084,-18.659,3.349,-8.084,-18.755,6.187,-6.187,-16.9587,6.187,-6.187],
// 4 16 -18.755 6.187 -6.187 -18.804 7.399 -4 -17 7.399 -4 -16.9587 6.187 -6.187
  [4,16,-18.755,6.187,-6.187,-18.804,7.399,-4,-17,7.399,-4,-16.9587,6.187,-6.187],
];
module ldraw_lib__3816bpbc(step=0, col=false, unit=2/5, alt=false, line=0.2, solid=!$preview)
    makepoly(ldraw_lib__3816bpbc(), step=step, col=col, unit=unit, alt=alt, line=line, solid=solid);
ldraw_lib__3816bpbc(line=0.2);
